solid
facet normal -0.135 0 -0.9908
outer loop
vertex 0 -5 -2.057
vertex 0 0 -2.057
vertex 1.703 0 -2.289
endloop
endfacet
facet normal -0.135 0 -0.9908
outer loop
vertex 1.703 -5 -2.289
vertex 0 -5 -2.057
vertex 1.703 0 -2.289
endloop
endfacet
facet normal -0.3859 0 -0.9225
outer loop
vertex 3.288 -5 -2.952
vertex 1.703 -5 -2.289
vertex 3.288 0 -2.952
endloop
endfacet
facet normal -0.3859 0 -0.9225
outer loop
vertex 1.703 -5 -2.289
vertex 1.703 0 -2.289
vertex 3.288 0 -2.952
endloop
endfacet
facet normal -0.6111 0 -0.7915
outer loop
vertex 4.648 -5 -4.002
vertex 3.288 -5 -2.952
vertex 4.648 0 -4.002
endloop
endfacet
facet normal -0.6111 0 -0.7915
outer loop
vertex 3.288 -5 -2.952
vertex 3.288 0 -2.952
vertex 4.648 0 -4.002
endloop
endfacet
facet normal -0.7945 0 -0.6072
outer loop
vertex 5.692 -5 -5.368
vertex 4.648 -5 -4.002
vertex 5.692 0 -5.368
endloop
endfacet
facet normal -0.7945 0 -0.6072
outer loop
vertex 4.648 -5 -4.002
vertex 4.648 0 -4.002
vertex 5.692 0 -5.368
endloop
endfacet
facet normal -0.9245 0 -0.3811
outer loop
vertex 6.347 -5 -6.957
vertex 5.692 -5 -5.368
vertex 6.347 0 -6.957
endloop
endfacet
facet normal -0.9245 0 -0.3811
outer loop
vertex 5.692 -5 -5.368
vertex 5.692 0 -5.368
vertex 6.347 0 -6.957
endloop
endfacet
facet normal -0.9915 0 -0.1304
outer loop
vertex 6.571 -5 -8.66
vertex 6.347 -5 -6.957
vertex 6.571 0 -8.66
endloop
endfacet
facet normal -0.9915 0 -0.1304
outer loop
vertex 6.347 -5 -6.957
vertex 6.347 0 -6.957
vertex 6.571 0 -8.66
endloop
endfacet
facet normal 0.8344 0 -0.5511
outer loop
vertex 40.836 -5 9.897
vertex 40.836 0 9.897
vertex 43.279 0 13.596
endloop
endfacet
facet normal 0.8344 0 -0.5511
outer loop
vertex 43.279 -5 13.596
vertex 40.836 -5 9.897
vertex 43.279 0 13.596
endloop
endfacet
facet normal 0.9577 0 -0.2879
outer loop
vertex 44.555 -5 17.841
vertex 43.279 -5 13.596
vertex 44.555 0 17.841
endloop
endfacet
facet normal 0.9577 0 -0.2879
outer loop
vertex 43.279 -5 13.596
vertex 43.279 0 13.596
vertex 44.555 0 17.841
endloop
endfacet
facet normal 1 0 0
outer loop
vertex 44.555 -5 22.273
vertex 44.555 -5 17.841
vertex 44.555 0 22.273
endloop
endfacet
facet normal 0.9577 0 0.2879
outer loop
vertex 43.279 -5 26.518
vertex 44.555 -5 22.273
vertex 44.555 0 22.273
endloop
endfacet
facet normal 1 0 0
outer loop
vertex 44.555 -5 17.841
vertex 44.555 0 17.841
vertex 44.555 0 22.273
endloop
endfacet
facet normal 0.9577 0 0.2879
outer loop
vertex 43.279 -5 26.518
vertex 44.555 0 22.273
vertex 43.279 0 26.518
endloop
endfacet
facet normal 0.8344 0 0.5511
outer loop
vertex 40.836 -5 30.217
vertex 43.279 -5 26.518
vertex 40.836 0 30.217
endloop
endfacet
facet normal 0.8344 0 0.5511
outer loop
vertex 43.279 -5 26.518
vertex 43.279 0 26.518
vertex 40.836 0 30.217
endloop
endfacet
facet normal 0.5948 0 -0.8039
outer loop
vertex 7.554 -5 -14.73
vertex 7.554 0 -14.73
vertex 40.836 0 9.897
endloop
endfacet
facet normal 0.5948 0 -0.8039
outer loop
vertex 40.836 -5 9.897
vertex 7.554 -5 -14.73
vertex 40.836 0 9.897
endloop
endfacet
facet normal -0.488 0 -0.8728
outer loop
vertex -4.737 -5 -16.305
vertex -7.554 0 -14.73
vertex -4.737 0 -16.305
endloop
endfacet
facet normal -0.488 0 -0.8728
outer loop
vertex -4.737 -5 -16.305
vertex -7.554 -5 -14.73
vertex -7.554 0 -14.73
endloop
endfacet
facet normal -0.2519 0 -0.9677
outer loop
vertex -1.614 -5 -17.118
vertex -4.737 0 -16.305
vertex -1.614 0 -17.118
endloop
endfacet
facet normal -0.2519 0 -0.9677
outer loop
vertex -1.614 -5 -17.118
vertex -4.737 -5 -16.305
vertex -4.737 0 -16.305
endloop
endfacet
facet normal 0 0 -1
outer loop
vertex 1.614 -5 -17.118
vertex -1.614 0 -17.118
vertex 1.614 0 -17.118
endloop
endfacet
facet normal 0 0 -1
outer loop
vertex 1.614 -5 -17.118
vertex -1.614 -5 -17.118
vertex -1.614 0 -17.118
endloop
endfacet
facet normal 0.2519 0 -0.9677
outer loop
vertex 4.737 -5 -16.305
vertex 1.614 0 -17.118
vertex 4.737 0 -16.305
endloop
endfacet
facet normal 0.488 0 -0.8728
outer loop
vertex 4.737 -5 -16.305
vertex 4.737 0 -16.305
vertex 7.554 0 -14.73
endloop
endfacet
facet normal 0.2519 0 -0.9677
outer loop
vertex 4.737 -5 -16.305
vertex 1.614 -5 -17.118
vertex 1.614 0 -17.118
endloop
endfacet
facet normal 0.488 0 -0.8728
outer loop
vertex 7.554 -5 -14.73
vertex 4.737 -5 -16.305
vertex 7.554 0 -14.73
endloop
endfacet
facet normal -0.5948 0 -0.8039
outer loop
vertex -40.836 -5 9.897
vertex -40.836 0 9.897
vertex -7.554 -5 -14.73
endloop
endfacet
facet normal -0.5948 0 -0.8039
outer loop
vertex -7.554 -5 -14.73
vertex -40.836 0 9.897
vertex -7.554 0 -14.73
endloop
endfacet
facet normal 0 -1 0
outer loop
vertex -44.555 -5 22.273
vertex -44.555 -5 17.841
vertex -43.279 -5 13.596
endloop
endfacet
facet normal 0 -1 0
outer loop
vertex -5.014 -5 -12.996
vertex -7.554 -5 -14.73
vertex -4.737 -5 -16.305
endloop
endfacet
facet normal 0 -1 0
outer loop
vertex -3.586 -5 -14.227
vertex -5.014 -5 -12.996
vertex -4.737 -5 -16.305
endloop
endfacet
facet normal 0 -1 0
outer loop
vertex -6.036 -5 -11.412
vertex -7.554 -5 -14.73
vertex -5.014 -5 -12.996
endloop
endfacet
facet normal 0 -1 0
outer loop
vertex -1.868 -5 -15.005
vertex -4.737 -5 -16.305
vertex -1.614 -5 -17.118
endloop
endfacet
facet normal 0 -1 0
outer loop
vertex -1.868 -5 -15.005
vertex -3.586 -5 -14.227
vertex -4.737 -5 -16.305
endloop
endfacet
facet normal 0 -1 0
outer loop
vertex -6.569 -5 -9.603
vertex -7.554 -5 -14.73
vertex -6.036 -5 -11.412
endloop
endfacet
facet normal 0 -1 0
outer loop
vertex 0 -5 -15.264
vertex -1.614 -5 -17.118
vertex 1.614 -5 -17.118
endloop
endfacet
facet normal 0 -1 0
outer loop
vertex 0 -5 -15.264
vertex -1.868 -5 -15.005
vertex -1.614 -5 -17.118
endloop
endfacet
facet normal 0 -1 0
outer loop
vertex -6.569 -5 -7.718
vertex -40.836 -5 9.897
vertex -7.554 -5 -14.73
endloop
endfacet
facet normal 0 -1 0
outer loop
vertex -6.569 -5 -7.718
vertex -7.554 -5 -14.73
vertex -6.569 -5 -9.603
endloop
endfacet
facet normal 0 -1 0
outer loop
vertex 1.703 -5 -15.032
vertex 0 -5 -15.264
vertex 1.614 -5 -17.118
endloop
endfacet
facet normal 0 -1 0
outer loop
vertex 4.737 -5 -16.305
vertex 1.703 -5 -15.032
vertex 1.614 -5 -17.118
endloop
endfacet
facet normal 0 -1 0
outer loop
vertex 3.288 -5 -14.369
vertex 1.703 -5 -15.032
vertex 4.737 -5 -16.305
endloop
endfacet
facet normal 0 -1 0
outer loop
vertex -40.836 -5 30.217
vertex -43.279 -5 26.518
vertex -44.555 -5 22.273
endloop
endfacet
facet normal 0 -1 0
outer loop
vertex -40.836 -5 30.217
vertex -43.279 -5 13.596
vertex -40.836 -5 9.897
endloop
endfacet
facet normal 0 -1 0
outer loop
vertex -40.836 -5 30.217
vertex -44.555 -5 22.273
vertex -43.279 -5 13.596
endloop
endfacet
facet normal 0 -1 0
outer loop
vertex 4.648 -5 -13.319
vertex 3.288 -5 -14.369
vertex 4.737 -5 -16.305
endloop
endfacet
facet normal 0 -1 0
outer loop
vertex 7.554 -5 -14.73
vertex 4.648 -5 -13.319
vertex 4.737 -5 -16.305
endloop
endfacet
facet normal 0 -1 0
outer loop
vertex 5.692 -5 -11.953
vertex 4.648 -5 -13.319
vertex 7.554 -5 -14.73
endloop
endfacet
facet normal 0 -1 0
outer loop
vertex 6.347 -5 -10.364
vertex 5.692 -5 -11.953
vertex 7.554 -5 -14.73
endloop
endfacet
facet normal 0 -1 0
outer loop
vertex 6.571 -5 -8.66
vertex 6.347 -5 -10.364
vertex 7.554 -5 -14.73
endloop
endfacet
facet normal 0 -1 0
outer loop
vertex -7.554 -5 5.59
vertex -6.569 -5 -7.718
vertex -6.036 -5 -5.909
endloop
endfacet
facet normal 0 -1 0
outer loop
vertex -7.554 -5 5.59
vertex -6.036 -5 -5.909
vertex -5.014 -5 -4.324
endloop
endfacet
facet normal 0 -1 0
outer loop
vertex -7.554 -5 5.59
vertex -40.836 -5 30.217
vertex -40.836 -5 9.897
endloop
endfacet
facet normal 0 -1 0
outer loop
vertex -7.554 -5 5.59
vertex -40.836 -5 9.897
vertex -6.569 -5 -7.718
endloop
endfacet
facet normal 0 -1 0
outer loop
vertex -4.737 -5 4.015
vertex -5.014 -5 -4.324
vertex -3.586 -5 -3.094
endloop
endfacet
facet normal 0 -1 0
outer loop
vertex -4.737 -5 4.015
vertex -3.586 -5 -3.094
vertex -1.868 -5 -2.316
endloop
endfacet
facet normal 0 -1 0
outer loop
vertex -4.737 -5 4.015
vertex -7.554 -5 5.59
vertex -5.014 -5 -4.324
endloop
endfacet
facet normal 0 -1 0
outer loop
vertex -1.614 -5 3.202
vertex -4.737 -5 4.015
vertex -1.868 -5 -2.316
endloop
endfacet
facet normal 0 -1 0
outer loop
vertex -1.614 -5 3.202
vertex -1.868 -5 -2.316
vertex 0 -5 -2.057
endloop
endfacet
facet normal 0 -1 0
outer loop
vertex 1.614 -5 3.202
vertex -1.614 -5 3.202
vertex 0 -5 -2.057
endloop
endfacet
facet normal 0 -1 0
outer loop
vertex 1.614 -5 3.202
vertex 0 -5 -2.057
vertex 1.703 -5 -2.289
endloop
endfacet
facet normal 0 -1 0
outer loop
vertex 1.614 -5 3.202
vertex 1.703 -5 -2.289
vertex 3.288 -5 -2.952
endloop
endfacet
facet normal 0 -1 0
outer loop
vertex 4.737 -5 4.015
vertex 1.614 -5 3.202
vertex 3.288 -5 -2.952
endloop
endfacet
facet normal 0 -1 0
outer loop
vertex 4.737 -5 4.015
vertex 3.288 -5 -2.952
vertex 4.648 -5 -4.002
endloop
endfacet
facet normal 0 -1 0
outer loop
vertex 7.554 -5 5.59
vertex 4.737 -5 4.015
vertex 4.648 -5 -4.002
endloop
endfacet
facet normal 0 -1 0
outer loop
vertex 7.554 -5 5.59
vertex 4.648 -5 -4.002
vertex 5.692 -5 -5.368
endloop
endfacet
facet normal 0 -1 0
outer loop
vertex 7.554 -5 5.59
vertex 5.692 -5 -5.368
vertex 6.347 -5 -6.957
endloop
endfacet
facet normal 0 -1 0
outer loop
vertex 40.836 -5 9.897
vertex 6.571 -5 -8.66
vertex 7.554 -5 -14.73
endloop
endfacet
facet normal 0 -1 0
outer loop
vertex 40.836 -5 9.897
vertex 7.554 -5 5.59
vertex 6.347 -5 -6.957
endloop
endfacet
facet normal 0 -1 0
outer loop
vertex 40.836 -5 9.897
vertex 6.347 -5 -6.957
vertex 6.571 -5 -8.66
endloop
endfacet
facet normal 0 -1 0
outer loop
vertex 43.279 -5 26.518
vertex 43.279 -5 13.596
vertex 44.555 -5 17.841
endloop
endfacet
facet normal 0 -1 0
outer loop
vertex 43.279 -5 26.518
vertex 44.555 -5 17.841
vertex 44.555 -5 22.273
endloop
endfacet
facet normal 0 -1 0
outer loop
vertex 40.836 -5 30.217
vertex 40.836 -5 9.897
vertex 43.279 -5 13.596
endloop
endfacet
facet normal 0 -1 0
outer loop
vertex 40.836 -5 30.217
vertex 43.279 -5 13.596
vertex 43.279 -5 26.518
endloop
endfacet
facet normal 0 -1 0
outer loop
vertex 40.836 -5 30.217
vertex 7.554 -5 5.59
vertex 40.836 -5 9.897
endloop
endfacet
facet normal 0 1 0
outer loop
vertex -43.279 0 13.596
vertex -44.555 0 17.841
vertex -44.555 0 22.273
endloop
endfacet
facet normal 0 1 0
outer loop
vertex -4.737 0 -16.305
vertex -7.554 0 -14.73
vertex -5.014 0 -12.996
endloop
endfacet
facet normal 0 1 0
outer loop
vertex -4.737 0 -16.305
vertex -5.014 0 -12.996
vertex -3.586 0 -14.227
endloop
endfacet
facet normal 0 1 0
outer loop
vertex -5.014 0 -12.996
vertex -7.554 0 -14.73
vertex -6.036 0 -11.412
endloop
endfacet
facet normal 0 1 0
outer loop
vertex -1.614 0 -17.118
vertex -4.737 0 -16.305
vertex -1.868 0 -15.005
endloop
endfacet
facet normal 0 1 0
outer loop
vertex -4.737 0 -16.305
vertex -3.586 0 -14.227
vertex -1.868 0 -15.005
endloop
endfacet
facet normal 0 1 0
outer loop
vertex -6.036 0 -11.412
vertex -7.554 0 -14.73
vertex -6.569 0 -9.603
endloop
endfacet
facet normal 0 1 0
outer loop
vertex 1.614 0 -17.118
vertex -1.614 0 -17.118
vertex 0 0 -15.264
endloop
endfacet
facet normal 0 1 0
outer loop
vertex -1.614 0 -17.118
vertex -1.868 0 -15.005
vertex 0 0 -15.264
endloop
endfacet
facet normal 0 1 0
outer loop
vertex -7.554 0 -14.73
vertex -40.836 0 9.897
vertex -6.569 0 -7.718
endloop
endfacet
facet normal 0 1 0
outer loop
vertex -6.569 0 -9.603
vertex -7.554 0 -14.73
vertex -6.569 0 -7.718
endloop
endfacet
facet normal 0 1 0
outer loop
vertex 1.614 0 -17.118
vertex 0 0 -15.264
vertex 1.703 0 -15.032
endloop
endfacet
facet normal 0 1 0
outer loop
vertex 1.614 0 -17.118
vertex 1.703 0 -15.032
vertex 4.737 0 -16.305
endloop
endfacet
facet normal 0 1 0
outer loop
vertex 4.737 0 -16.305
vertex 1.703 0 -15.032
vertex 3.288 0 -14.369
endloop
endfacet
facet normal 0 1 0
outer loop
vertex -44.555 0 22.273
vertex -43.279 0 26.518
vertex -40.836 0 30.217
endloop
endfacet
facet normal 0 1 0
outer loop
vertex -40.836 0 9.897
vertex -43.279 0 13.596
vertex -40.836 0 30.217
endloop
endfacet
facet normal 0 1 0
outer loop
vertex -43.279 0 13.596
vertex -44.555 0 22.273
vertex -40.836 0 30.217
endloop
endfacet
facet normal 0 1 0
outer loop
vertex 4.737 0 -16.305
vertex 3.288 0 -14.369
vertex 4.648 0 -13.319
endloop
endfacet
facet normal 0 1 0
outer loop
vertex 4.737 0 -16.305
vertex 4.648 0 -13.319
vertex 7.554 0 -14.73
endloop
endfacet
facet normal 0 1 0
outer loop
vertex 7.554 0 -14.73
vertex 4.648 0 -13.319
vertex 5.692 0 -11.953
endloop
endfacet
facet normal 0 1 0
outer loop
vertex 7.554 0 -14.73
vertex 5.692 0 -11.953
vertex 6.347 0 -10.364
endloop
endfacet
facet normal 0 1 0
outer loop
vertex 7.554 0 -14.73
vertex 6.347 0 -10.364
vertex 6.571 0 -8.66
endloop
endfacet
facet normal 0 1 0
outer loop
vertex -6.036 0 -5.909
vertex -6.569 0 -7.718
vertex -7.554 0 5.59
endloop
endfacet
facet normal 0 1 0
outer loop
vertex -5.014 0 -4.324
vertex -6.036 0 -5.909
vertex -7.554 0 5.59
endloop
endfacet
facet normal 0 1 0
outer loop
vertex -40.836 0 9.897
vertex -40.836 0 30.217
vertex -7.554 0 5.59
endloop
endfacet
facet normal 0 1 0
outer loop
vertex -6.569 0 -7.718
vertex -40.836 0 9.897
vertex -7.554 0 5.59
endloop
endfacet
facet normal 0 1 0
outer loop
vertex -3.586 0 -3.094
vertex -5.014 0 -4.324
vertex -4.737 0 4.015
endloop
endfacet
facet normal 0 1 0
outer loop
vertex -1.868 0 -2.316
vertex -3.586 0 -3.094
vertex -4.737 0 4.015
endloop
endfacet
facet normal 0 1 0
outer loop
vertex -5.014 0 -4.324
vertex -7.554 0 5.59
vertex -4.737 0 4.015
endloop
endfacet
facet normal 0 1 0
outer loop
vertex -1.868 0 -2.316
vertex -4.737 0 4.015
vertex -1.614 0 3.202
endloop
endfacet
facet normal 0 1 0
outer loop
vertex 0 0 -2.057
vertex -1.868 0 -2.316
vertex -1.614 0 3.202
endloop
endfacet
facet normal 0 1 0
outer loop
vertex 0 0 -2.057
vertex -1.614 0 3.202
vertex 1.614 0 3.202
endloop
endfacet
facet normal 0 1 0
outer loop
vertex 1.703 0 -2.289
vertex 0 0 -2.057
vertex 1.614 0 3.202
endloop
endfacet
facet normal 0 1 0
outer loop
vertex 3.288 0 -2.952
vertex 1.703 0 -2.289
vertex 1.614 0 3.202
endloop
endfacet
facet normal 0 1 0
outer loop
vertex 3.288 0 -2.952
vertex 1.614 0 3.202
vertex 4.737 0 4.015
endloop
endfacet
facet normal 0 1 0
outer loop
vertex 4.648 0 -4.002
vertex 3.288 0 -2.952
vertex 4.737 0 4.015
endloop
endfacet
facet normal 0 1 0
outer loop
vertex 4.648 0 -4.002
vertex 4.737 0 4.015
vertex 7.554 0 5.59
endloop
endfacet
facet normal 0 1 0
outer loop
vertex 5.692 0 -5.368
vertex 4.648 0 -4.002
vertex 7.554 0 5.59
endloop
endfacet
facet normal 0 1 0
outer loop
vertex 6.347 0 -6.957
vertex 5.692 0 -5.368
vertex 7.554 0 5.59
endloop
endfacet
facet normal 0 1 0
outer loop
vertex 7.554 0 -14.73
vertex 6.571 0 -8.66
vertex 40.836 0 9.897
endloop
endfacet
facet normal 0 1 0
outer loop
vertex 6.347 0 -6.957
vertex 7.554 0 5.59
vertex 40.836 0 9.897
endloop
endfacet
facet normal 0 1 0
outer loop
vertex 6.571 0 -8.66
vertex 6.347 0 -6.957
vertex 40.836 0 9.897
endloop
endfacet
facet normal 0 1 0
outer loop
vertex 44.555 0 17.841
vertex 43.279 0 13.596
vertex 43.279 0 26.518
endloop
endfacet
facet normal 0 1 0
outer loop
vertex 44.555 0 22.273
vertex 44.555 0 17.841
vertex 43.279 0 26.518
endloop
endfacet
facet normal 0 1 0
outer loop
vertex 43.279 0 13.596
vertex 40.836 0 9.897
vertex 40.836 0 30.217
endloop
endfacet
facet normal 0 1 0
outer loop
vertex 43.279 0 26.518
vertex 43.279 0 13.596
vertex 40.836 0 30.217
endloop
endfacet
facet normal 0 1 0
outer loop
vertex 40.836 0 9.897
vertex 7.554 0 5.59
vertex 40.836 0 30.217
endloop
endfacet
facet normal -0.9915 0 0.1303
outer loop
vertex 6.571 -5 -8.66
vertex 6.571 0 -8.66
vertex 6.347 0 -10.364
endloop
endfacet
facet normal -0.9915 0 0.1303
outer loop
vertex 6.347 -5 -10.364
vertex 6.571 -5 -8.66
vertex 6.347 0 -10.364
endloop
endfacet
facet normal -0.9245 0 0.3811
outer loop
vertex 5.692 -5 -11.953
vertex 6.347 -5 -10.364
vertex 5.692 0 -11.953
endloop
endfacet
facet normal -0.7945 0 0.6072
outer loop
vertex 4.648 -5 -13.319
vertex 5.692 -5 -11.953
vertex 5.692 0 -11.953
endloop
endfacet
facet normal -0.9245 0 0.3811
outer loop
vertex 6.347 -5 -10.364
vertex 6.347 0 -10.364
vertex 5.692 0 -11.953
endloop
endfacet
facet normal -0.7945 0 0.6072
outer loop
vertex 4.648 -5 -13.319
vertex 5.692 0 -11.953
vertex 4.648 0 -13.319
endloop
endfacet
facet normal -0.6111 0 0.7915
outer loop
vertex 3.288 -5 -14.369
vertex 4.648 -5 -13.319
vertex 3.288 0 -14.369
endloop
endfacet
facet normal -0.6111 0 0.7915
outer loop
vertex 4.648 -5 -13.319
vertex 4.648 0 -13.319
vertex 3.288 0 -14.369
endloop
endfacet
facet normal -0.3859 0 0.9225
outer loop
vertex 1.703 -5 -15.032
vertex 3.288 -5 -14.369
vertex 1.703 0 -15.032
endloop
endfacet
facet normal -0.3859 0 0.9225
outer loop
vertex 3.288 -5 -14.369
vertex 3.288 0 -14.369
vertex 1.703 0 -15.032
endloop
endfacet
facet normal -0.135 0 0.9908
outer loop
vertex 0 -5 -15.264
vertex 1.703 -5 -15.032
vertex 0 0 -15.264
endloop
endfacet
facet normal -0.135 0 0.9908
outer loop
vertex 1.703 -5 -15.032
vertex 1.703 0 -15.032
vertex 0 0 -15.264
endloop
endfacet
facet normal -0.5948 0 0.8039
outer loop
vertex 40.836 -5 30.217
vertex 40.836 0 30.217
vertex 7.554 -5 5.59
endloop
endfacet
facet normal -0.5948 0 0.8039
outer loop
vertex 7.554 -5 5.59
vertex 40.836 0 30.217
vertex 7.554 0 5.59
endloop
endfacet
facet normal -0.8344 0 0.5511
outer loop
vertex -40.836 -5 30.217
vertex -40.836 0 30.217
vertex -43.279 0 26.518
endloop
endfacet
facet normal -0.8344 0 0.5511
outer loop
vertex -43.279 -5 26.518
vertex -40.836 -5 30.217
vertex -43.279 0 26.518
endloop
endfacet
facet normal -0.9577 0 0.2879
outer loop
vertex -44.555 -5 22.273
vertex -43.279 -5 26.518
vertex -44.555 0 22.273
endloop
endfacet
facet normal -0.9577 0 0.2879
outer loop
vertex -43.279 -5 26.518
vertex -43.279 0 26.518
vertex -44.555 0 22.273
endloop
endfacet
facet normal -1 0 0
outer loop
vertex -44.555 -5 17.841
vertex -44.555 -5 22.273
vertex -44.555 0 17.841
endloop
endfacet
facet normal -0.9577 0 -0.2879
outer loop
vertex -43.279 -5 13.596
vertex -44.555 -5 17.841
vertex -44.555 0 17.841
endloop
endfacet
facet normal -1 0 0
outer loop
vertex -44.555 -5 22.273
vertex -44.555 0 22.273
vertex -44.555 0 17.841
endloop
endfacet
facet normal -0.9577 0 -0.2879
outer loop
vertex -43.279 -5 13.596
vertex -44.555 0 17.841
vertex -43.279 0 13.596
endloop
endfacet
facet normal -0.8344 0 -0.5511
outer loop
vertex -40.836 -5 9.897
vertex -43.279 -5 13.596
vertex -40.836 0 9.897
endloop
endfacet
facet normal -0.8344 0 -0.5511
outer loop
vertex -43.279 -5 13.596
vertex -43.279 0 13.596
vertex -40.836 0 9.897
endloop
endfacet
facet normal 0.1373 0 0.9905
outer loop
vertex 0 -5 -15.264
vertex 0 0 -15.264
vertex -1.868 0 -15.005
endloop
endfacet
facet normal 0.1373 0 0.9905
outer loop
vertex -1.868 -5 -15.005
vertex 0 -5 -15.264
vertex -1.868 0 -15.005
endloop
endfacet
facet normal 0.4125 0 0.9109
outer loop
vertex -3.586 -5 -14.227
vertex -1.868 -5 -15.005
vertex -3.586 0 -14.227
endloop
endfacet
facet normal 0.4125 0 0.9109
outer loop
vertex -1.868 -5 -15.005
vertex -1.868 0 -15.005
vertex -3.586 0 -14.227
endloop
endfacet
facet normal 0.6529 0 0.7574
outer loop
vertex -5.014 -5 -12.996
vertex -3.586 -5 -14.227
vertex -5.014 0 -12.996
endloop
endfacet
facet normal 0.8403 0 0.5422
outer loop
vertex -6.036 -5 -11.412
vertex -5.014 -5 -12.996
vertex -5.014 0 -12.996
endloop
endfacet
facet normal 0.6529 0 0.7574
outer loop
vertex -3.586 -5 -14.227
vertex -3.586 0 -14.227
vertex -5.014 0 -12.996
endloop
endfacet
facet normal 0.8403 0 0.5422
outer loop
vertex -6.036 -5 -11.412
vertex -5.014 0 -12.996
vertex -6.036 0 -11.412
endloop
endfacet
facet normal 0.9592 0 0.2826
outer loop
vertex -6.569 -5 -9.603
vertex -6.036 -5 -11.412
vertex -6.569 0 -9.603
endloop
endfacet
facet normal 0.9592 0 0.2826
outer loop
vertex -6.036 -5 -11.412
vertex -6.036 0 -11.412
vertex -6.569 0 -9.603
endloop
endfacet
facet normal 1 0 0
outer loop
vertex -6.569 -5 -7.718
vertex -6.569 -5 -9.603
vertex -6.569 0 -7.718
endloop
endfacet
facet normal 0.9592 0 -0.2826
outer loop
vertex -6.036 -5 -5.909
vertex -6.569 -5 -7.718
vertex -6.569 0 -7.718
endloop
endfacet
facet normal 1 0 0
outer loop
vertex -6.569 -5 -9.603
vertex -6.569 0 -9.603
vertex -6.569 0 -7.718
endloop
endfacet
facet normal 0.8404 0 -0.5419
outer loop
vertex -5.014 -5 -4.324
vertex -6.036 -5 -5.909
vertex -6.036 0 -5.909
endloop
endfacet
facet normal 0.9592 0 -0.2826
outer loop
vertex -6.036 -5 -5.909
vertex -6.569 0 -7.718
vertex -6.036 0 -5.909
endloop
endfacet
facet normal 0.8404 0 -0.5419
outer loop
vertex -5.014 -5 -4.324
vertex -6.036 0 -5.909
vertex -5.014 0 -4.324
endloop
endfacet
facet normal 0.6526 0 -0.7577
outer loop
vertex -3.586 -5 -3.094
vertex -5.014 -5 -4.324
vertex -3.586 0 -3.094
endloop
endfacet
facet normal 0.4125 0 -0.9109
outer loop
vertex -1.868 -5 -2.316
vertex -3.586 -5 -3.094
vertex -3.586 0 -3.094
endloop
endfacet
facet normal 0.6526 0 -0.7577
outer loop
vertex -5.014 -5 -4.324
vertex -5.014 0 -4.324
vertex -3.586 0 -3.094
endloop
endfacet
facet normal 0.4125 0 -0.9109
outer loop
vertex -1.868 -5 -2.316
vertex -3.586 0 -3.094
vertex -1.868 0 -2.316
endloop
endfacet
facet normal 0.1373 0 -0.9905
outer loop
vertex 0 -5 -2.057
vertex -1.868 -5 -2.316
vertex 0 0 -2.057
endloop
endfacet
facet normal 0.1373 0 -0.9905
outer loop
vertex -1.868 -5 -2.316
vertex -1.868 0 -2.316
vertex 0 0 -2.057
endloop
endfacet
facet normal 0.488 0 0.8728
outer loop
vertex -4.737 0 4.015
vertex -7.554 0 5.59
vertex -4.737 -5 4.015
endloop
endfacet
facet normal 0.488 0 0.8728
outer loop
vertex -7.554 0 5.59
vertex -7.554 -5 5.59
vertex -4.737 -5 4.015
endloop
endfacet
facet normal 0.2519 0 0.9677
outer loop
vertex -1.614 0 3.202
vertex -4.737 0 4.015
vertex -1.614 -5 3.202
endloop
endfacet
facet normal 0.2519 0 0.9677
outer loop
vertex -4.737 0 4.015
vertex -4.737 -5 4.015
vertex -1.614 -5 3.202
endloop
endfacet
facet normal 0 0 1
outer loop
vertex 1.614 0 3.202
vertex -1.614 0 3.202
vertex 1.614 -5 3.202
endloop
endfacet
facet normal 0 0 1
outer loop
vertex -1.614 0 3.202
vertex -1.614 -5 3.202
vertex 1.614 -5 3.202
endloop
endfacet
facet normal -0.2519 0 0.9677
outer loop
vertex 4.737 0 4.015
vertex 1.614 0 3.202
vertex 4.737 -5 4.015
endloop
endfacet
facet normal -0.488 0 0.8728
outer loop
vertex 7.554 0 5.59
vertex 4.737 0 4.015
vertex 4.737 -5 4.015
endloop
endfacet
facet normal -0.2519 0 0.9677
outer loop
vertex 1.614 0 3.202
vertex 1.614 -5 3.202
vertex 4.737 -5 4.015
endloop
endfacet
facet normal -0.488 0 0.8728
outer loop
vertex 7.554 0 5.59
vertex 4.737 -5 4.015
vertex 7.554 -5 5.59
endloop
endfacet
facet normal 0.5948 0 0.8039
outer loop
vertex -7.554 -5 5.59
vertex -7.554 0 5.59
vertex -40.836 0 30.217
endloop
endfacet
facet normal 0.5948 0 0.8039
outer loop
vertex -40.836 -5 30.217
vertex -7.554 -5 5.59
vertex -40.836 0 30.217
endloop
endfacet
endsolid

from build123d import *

# Parameters (mm, degrees)
F1_DEPTH = 5
F2_R     = 12.7


with BuildPart() as f1:
    # F0 (on Front) → F1 (new body)
    with BuildSketch(Plane.XZ):
        with BuildLine():
            Line((0, -2.056562), (0, 0))
            Line((0, 0), (-40.835929, 30.216998))
            ThreePointArc((-40.835929, 30.216998), (-44.716703, 20.056998), (-40.835929, 9.896998))
            Line((-40.835929, 9.896998), (0, -20.32))
            Line((0, -20.32), (0, -15.264398))
            ThreePointArc((0, -15.264398), (-6.636931, -8.66048), (0, -2.056562))
        make_face()
        with BuildLine():
            Line((40.835929, 30.216998), (0, 0))
            Line((0, 0), (0, -2.056562))
            ThreePointArc((0, -2.056562), (4.64843, -4.002405), (6.571069, -8.66048))
            ThreePointArc((6.571069, -8.66048), (4.64843, -13.318556), (0, -15.264398))
            Line((0, -15.264398), (0, -20.32))
            Line((0, -20.32), (40.835929, 9.896998))
            ThreePointArc((40.835929, 9.896998), (44.716703, 20.056998), (40.835929, 30.216998))
        make_face()
    extrude(amount=F1_DEPTH)

    # F2
    f2_edges = [f1.edges().sort_by_distance(p)[0] for p in [
        (0, -2.5, -20.32),
        (0, -2.5, 0),
    ]]
    fillet(f2_edges, radius=F2_R)


solid = f1.part
